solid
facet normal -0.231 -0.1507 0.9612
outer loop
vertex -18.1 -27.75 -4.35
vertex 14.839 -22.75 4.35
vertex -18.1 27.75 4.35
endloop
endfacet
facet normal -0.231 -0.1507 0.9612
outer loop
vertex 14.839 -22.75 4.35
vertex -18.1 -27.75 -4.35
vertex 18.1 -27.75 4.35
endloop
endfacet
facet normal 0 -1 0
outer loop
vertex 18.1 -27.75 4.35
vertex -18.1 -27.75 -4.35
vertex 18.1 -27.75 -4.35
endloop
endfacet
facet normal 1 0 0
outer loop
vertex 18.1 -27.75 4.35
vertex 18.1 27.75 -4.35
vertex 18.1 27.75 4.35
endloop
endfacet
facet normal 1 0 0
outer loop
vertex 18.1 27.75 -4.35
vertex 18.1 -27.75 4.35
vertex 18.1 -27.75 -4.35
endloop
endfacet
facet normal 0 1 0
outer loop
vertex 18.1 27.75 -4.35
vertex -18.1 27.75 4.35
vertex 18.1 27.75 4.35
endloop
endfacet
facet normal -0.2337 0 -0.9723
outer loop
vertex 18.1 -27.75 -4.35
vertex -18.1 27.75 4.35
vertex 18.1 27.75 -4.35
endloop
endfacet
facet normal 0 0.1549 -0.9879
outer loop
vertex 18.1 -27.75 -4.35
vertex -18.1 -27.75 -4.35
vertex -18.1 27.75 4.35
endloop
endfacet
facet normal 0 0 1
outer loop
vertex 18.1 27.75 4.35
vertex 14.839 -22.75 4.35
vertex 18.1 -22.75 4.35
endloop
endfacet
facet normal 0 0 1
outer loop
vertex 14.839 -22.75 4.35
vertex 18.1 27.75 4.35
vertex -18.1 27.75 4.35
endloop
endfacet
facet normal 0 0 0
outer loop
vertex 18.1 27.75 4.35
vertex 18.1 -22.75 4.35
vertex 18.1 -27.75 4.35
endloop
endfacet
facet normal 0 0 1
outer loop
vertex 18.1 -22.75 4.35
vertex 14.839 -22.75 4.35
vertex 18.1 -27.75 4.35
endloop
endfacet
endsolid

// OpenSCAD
module tapered_wedge() {
    difference() {
        // Main wedge shape
        polyhedron(
            points=[
                [0, 0, 0],        // Point 0
                [36.2, 0, 0],     // Point 1
                [36.2, 55.5, 0],  // Point 2
                [0, 55.5, 8.7],   // Point 3
                [36.2, 0, 8.7],   // Point 4
                [36.2, 55.5, 8.7] // Point 5
            ],
            faces=[
                [0, 1, 4, 3],     // Bottom face
                [1, 2, 5, 4],     // Side face
                [2, 3, 5],        // Top face
                [0, 3, 2, 1],     // Back face
                [3, 4, 5]         // Front face
            ]
        );

        // Create the step/flange
        translate([0, 0, 8.7])
        cube([36.2, 5, 1]);
    }
}

translate([-18.1, -27.75, -4.35])
tapered_wedge();
